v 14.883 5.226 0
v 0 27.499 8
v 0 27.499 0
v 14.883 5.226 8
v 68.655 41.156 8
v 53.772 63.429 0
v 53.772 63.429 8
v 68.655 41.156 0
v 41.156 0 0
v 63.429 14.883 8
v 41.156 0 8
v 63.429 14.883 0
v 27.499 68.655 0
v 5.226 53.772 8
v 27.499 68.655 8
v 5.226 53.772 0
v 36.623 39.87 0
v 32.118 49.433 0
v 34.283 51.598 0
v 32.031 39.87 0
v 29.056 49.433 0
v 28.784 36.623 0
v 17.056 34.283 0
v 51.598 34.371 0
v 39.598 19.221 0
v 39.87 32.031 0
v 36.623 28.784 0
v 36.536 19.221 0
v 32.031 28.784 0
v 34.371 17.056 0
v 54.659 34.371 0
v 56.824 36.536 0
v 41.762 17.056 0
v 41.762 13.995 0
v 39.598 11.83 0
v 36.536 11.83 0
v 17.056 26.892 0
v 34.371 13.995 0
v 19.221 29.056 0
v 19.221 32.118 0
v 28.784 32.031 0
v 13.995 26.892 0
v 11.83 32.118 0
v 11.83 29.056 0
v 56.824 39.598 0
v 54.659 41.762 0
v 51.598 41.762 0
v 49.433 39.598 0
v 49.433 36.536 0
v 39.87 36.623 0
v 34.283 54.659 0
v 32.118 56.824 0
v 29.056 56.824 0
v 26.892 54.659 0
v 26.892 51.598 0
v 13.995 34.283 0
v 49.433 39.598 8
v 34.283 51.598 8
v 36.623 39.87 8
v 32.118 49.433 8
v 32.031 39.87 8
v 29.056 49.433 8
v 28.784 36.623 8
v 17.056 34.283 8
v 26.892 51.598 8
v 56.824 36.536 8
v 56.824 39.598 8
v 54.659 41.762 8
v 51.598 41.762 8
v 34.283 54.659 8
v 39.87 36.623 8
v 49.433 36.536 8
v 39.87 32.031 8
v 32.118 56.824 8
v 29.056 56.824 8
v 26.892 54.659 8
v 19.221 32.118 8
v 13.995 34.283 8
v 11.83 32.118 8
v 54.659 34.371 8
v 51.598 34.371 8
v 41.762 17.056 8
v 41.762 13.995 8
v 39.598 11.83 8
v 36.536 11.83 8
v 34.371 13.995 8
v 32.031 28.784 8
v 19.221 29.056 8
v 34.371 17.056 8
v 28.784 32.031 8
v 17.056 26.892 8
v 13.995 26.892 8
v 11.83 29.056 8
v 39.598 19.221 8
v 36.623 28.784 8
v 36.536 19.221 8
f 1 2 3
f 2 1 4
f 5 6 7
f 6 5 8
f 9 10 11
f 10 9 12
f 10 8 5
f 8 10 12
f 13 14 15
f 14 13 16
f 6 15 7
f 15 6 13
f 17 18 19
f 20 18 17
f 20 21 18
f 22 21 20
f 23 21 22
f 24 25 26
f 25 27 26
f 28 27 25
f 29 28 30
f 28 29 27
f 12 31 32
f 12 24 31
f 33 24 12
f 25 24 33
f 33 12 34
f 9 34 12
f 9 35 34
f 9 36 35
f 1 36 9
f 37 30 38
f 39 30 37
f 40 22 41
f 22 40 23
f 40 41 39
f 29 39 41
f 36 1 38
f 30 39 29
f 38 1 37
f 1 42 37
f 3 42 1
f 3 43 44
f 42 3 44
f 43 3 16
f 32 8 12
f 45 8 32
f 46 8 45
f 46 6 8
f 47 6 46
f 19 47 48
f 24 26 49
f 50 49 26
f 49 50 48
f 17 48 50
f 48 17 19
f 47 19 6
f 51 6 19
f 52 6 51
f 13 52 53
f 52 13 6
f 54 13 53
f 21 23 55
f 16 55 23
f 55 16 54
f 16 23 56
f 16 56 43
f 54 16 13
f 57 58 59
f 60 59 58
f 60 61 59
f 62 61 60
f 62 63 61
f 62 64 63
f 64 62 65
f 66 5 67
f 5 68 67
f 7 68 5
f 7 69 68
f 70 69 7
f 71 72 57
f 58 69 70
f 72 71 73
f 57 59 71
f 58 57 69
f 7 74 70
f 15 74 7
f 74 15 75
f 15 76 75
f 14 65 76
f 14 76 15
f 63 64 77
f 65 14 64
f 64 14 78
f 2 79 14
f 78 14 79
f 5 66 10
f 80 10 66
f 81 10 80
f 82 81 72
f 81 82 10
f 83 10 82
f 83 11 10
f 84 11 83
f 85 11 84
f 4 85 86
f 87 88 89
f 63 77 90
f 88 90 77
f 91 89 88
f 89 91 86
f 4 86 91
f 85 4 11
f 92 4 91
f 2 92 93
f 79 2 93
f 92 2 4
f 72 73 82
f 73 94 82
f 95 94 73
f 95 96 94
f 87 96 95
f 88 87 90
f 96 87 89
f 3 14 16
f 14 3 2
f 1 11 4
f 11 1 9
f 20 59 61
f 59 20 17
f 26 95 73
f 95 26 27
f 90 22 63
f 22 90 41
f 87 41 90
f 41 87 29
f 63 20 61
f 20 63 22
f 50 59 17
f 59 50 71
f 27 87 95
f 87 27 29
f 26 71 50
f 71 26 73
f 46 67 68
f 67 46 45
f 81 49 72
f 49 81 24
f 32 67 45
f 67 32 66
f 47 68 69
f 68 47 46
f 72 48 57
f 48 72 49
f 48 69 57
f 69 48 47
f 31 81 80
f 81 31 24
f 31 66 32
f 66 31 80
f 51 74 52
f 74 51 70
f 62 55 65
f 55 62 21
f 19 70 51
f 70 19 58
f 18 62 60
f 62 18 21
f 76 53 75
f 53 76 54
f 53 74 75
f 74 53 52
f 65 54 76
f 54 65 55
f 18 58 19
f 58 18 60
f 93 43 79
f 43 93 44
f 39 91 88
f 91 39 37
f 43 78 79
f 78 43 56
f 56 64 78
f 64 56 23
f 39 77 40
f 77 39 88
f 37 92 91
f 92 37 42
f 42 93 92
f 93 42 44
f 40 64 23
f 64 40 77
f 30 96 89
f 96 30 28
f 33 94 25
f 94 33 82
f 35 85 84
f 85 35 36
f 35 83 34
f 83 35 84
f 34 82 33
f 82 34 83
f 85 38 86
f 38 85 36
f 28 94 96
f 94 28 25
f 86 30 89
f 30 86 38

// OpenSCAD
$fn = 32;

// ----------------------------------------------------------------------
// Polygon plate: 8-gon R35, 4 bolt windows
// ----------------------------------------------------------------------

// --- parameters (mm) ---
sides = 8;                // number of polygon sides
plate_r = 35;             // circumscribed radius of the polygon
bore_r = 6;               // centre bore radius
bolts = 4;                // number of bolt windows
ring_r = 19.17;           // bolt-circle radius
bolt_r = 4;               // bolt window radius
plate_t = 8;              // plate thickness, Z (extrusion height)

plate_d = 2 * plate_r;  // circumscribed diameter
bore_d = 2 * bore_r;  // centre bore diameter
bolt_d = 2 * bolt_r;  // bolt window diameter
ring_d = 2 * ring_r;  // bolt-circle diameter

profile = [[68.655, 41.156], [53.772, 63.429], [27.499, 68.655], [5.226, 53.772], [0, 27.499], [14.883, 5.226], [41.156, 0], [63.429, 14.883]];  // primary outline, 8 points, counter clockwise
void_1 = [[39.87, 36.623], [36.623, 39.87], [32.031, 39.87], [28.784, 36.623], [28.784, 32.031], [32.031, 28.784], [36.623, 28.784], [39.87, 32.031]];  // centre bore, 8 points
void_2 = [[56.824, 39.598], [54.659, 41.762], [51.598, 41.762], [49.433, 39.598], [49.433, 36.536], [51.598, 34.371], [54.659, 34.371], [56.824, 36.536]];  // bolt window 1, 8 points
void_3 = [[34.283, 54.659], [32.118, 56.824], [29.056, 56.824], [26.892, 54.659], [26.892, 51.598], [29.056, 49.433], [32.118, 49.433], [34.283, 51.598]];  // bolt window 2, 8 points
void_4 = [[19.221, 32.118], [17.056, 34.283], [13.995, 34.283], [11.83, 32.118], [11.83, 29.056], [13.995, 26.892], [17.056, 26.892], [19.221, 29.056]];  // bolt window 3, 8 points
void_5 = [[41.762, 17.056], [39.598, 19.221], [36.536, 19.221], [34.371, 17.056], [34.371, 13.995], [36.536, 11.83], [39.598, 11.83], [41.762, 13.995]];  // bolt window 4, 8 points

// --- the one profile operation ---
difference() {
  linear_extrude(height = plate_t) polygon(points = profile);
  translate([0, 0, -1])
    linear_extrude(height = plate_t + 2) polygon(points = void_1);
  translate([0, 0, -1])
    linear_extrude(height = plate_t + 2) polygon(points = void_2);
  translate([0, 0, -1])
    linear_extrude(height = plate_t + 2) polygon(points = void_3);
  translate([0, 0, -1])
    linear_extrude(height = plate_t + 2) polygon(points = void_4);
  translate([0, 0, -1])
    linear_extrude(height = plate_t + 2) polygon(points = void_5);
}
